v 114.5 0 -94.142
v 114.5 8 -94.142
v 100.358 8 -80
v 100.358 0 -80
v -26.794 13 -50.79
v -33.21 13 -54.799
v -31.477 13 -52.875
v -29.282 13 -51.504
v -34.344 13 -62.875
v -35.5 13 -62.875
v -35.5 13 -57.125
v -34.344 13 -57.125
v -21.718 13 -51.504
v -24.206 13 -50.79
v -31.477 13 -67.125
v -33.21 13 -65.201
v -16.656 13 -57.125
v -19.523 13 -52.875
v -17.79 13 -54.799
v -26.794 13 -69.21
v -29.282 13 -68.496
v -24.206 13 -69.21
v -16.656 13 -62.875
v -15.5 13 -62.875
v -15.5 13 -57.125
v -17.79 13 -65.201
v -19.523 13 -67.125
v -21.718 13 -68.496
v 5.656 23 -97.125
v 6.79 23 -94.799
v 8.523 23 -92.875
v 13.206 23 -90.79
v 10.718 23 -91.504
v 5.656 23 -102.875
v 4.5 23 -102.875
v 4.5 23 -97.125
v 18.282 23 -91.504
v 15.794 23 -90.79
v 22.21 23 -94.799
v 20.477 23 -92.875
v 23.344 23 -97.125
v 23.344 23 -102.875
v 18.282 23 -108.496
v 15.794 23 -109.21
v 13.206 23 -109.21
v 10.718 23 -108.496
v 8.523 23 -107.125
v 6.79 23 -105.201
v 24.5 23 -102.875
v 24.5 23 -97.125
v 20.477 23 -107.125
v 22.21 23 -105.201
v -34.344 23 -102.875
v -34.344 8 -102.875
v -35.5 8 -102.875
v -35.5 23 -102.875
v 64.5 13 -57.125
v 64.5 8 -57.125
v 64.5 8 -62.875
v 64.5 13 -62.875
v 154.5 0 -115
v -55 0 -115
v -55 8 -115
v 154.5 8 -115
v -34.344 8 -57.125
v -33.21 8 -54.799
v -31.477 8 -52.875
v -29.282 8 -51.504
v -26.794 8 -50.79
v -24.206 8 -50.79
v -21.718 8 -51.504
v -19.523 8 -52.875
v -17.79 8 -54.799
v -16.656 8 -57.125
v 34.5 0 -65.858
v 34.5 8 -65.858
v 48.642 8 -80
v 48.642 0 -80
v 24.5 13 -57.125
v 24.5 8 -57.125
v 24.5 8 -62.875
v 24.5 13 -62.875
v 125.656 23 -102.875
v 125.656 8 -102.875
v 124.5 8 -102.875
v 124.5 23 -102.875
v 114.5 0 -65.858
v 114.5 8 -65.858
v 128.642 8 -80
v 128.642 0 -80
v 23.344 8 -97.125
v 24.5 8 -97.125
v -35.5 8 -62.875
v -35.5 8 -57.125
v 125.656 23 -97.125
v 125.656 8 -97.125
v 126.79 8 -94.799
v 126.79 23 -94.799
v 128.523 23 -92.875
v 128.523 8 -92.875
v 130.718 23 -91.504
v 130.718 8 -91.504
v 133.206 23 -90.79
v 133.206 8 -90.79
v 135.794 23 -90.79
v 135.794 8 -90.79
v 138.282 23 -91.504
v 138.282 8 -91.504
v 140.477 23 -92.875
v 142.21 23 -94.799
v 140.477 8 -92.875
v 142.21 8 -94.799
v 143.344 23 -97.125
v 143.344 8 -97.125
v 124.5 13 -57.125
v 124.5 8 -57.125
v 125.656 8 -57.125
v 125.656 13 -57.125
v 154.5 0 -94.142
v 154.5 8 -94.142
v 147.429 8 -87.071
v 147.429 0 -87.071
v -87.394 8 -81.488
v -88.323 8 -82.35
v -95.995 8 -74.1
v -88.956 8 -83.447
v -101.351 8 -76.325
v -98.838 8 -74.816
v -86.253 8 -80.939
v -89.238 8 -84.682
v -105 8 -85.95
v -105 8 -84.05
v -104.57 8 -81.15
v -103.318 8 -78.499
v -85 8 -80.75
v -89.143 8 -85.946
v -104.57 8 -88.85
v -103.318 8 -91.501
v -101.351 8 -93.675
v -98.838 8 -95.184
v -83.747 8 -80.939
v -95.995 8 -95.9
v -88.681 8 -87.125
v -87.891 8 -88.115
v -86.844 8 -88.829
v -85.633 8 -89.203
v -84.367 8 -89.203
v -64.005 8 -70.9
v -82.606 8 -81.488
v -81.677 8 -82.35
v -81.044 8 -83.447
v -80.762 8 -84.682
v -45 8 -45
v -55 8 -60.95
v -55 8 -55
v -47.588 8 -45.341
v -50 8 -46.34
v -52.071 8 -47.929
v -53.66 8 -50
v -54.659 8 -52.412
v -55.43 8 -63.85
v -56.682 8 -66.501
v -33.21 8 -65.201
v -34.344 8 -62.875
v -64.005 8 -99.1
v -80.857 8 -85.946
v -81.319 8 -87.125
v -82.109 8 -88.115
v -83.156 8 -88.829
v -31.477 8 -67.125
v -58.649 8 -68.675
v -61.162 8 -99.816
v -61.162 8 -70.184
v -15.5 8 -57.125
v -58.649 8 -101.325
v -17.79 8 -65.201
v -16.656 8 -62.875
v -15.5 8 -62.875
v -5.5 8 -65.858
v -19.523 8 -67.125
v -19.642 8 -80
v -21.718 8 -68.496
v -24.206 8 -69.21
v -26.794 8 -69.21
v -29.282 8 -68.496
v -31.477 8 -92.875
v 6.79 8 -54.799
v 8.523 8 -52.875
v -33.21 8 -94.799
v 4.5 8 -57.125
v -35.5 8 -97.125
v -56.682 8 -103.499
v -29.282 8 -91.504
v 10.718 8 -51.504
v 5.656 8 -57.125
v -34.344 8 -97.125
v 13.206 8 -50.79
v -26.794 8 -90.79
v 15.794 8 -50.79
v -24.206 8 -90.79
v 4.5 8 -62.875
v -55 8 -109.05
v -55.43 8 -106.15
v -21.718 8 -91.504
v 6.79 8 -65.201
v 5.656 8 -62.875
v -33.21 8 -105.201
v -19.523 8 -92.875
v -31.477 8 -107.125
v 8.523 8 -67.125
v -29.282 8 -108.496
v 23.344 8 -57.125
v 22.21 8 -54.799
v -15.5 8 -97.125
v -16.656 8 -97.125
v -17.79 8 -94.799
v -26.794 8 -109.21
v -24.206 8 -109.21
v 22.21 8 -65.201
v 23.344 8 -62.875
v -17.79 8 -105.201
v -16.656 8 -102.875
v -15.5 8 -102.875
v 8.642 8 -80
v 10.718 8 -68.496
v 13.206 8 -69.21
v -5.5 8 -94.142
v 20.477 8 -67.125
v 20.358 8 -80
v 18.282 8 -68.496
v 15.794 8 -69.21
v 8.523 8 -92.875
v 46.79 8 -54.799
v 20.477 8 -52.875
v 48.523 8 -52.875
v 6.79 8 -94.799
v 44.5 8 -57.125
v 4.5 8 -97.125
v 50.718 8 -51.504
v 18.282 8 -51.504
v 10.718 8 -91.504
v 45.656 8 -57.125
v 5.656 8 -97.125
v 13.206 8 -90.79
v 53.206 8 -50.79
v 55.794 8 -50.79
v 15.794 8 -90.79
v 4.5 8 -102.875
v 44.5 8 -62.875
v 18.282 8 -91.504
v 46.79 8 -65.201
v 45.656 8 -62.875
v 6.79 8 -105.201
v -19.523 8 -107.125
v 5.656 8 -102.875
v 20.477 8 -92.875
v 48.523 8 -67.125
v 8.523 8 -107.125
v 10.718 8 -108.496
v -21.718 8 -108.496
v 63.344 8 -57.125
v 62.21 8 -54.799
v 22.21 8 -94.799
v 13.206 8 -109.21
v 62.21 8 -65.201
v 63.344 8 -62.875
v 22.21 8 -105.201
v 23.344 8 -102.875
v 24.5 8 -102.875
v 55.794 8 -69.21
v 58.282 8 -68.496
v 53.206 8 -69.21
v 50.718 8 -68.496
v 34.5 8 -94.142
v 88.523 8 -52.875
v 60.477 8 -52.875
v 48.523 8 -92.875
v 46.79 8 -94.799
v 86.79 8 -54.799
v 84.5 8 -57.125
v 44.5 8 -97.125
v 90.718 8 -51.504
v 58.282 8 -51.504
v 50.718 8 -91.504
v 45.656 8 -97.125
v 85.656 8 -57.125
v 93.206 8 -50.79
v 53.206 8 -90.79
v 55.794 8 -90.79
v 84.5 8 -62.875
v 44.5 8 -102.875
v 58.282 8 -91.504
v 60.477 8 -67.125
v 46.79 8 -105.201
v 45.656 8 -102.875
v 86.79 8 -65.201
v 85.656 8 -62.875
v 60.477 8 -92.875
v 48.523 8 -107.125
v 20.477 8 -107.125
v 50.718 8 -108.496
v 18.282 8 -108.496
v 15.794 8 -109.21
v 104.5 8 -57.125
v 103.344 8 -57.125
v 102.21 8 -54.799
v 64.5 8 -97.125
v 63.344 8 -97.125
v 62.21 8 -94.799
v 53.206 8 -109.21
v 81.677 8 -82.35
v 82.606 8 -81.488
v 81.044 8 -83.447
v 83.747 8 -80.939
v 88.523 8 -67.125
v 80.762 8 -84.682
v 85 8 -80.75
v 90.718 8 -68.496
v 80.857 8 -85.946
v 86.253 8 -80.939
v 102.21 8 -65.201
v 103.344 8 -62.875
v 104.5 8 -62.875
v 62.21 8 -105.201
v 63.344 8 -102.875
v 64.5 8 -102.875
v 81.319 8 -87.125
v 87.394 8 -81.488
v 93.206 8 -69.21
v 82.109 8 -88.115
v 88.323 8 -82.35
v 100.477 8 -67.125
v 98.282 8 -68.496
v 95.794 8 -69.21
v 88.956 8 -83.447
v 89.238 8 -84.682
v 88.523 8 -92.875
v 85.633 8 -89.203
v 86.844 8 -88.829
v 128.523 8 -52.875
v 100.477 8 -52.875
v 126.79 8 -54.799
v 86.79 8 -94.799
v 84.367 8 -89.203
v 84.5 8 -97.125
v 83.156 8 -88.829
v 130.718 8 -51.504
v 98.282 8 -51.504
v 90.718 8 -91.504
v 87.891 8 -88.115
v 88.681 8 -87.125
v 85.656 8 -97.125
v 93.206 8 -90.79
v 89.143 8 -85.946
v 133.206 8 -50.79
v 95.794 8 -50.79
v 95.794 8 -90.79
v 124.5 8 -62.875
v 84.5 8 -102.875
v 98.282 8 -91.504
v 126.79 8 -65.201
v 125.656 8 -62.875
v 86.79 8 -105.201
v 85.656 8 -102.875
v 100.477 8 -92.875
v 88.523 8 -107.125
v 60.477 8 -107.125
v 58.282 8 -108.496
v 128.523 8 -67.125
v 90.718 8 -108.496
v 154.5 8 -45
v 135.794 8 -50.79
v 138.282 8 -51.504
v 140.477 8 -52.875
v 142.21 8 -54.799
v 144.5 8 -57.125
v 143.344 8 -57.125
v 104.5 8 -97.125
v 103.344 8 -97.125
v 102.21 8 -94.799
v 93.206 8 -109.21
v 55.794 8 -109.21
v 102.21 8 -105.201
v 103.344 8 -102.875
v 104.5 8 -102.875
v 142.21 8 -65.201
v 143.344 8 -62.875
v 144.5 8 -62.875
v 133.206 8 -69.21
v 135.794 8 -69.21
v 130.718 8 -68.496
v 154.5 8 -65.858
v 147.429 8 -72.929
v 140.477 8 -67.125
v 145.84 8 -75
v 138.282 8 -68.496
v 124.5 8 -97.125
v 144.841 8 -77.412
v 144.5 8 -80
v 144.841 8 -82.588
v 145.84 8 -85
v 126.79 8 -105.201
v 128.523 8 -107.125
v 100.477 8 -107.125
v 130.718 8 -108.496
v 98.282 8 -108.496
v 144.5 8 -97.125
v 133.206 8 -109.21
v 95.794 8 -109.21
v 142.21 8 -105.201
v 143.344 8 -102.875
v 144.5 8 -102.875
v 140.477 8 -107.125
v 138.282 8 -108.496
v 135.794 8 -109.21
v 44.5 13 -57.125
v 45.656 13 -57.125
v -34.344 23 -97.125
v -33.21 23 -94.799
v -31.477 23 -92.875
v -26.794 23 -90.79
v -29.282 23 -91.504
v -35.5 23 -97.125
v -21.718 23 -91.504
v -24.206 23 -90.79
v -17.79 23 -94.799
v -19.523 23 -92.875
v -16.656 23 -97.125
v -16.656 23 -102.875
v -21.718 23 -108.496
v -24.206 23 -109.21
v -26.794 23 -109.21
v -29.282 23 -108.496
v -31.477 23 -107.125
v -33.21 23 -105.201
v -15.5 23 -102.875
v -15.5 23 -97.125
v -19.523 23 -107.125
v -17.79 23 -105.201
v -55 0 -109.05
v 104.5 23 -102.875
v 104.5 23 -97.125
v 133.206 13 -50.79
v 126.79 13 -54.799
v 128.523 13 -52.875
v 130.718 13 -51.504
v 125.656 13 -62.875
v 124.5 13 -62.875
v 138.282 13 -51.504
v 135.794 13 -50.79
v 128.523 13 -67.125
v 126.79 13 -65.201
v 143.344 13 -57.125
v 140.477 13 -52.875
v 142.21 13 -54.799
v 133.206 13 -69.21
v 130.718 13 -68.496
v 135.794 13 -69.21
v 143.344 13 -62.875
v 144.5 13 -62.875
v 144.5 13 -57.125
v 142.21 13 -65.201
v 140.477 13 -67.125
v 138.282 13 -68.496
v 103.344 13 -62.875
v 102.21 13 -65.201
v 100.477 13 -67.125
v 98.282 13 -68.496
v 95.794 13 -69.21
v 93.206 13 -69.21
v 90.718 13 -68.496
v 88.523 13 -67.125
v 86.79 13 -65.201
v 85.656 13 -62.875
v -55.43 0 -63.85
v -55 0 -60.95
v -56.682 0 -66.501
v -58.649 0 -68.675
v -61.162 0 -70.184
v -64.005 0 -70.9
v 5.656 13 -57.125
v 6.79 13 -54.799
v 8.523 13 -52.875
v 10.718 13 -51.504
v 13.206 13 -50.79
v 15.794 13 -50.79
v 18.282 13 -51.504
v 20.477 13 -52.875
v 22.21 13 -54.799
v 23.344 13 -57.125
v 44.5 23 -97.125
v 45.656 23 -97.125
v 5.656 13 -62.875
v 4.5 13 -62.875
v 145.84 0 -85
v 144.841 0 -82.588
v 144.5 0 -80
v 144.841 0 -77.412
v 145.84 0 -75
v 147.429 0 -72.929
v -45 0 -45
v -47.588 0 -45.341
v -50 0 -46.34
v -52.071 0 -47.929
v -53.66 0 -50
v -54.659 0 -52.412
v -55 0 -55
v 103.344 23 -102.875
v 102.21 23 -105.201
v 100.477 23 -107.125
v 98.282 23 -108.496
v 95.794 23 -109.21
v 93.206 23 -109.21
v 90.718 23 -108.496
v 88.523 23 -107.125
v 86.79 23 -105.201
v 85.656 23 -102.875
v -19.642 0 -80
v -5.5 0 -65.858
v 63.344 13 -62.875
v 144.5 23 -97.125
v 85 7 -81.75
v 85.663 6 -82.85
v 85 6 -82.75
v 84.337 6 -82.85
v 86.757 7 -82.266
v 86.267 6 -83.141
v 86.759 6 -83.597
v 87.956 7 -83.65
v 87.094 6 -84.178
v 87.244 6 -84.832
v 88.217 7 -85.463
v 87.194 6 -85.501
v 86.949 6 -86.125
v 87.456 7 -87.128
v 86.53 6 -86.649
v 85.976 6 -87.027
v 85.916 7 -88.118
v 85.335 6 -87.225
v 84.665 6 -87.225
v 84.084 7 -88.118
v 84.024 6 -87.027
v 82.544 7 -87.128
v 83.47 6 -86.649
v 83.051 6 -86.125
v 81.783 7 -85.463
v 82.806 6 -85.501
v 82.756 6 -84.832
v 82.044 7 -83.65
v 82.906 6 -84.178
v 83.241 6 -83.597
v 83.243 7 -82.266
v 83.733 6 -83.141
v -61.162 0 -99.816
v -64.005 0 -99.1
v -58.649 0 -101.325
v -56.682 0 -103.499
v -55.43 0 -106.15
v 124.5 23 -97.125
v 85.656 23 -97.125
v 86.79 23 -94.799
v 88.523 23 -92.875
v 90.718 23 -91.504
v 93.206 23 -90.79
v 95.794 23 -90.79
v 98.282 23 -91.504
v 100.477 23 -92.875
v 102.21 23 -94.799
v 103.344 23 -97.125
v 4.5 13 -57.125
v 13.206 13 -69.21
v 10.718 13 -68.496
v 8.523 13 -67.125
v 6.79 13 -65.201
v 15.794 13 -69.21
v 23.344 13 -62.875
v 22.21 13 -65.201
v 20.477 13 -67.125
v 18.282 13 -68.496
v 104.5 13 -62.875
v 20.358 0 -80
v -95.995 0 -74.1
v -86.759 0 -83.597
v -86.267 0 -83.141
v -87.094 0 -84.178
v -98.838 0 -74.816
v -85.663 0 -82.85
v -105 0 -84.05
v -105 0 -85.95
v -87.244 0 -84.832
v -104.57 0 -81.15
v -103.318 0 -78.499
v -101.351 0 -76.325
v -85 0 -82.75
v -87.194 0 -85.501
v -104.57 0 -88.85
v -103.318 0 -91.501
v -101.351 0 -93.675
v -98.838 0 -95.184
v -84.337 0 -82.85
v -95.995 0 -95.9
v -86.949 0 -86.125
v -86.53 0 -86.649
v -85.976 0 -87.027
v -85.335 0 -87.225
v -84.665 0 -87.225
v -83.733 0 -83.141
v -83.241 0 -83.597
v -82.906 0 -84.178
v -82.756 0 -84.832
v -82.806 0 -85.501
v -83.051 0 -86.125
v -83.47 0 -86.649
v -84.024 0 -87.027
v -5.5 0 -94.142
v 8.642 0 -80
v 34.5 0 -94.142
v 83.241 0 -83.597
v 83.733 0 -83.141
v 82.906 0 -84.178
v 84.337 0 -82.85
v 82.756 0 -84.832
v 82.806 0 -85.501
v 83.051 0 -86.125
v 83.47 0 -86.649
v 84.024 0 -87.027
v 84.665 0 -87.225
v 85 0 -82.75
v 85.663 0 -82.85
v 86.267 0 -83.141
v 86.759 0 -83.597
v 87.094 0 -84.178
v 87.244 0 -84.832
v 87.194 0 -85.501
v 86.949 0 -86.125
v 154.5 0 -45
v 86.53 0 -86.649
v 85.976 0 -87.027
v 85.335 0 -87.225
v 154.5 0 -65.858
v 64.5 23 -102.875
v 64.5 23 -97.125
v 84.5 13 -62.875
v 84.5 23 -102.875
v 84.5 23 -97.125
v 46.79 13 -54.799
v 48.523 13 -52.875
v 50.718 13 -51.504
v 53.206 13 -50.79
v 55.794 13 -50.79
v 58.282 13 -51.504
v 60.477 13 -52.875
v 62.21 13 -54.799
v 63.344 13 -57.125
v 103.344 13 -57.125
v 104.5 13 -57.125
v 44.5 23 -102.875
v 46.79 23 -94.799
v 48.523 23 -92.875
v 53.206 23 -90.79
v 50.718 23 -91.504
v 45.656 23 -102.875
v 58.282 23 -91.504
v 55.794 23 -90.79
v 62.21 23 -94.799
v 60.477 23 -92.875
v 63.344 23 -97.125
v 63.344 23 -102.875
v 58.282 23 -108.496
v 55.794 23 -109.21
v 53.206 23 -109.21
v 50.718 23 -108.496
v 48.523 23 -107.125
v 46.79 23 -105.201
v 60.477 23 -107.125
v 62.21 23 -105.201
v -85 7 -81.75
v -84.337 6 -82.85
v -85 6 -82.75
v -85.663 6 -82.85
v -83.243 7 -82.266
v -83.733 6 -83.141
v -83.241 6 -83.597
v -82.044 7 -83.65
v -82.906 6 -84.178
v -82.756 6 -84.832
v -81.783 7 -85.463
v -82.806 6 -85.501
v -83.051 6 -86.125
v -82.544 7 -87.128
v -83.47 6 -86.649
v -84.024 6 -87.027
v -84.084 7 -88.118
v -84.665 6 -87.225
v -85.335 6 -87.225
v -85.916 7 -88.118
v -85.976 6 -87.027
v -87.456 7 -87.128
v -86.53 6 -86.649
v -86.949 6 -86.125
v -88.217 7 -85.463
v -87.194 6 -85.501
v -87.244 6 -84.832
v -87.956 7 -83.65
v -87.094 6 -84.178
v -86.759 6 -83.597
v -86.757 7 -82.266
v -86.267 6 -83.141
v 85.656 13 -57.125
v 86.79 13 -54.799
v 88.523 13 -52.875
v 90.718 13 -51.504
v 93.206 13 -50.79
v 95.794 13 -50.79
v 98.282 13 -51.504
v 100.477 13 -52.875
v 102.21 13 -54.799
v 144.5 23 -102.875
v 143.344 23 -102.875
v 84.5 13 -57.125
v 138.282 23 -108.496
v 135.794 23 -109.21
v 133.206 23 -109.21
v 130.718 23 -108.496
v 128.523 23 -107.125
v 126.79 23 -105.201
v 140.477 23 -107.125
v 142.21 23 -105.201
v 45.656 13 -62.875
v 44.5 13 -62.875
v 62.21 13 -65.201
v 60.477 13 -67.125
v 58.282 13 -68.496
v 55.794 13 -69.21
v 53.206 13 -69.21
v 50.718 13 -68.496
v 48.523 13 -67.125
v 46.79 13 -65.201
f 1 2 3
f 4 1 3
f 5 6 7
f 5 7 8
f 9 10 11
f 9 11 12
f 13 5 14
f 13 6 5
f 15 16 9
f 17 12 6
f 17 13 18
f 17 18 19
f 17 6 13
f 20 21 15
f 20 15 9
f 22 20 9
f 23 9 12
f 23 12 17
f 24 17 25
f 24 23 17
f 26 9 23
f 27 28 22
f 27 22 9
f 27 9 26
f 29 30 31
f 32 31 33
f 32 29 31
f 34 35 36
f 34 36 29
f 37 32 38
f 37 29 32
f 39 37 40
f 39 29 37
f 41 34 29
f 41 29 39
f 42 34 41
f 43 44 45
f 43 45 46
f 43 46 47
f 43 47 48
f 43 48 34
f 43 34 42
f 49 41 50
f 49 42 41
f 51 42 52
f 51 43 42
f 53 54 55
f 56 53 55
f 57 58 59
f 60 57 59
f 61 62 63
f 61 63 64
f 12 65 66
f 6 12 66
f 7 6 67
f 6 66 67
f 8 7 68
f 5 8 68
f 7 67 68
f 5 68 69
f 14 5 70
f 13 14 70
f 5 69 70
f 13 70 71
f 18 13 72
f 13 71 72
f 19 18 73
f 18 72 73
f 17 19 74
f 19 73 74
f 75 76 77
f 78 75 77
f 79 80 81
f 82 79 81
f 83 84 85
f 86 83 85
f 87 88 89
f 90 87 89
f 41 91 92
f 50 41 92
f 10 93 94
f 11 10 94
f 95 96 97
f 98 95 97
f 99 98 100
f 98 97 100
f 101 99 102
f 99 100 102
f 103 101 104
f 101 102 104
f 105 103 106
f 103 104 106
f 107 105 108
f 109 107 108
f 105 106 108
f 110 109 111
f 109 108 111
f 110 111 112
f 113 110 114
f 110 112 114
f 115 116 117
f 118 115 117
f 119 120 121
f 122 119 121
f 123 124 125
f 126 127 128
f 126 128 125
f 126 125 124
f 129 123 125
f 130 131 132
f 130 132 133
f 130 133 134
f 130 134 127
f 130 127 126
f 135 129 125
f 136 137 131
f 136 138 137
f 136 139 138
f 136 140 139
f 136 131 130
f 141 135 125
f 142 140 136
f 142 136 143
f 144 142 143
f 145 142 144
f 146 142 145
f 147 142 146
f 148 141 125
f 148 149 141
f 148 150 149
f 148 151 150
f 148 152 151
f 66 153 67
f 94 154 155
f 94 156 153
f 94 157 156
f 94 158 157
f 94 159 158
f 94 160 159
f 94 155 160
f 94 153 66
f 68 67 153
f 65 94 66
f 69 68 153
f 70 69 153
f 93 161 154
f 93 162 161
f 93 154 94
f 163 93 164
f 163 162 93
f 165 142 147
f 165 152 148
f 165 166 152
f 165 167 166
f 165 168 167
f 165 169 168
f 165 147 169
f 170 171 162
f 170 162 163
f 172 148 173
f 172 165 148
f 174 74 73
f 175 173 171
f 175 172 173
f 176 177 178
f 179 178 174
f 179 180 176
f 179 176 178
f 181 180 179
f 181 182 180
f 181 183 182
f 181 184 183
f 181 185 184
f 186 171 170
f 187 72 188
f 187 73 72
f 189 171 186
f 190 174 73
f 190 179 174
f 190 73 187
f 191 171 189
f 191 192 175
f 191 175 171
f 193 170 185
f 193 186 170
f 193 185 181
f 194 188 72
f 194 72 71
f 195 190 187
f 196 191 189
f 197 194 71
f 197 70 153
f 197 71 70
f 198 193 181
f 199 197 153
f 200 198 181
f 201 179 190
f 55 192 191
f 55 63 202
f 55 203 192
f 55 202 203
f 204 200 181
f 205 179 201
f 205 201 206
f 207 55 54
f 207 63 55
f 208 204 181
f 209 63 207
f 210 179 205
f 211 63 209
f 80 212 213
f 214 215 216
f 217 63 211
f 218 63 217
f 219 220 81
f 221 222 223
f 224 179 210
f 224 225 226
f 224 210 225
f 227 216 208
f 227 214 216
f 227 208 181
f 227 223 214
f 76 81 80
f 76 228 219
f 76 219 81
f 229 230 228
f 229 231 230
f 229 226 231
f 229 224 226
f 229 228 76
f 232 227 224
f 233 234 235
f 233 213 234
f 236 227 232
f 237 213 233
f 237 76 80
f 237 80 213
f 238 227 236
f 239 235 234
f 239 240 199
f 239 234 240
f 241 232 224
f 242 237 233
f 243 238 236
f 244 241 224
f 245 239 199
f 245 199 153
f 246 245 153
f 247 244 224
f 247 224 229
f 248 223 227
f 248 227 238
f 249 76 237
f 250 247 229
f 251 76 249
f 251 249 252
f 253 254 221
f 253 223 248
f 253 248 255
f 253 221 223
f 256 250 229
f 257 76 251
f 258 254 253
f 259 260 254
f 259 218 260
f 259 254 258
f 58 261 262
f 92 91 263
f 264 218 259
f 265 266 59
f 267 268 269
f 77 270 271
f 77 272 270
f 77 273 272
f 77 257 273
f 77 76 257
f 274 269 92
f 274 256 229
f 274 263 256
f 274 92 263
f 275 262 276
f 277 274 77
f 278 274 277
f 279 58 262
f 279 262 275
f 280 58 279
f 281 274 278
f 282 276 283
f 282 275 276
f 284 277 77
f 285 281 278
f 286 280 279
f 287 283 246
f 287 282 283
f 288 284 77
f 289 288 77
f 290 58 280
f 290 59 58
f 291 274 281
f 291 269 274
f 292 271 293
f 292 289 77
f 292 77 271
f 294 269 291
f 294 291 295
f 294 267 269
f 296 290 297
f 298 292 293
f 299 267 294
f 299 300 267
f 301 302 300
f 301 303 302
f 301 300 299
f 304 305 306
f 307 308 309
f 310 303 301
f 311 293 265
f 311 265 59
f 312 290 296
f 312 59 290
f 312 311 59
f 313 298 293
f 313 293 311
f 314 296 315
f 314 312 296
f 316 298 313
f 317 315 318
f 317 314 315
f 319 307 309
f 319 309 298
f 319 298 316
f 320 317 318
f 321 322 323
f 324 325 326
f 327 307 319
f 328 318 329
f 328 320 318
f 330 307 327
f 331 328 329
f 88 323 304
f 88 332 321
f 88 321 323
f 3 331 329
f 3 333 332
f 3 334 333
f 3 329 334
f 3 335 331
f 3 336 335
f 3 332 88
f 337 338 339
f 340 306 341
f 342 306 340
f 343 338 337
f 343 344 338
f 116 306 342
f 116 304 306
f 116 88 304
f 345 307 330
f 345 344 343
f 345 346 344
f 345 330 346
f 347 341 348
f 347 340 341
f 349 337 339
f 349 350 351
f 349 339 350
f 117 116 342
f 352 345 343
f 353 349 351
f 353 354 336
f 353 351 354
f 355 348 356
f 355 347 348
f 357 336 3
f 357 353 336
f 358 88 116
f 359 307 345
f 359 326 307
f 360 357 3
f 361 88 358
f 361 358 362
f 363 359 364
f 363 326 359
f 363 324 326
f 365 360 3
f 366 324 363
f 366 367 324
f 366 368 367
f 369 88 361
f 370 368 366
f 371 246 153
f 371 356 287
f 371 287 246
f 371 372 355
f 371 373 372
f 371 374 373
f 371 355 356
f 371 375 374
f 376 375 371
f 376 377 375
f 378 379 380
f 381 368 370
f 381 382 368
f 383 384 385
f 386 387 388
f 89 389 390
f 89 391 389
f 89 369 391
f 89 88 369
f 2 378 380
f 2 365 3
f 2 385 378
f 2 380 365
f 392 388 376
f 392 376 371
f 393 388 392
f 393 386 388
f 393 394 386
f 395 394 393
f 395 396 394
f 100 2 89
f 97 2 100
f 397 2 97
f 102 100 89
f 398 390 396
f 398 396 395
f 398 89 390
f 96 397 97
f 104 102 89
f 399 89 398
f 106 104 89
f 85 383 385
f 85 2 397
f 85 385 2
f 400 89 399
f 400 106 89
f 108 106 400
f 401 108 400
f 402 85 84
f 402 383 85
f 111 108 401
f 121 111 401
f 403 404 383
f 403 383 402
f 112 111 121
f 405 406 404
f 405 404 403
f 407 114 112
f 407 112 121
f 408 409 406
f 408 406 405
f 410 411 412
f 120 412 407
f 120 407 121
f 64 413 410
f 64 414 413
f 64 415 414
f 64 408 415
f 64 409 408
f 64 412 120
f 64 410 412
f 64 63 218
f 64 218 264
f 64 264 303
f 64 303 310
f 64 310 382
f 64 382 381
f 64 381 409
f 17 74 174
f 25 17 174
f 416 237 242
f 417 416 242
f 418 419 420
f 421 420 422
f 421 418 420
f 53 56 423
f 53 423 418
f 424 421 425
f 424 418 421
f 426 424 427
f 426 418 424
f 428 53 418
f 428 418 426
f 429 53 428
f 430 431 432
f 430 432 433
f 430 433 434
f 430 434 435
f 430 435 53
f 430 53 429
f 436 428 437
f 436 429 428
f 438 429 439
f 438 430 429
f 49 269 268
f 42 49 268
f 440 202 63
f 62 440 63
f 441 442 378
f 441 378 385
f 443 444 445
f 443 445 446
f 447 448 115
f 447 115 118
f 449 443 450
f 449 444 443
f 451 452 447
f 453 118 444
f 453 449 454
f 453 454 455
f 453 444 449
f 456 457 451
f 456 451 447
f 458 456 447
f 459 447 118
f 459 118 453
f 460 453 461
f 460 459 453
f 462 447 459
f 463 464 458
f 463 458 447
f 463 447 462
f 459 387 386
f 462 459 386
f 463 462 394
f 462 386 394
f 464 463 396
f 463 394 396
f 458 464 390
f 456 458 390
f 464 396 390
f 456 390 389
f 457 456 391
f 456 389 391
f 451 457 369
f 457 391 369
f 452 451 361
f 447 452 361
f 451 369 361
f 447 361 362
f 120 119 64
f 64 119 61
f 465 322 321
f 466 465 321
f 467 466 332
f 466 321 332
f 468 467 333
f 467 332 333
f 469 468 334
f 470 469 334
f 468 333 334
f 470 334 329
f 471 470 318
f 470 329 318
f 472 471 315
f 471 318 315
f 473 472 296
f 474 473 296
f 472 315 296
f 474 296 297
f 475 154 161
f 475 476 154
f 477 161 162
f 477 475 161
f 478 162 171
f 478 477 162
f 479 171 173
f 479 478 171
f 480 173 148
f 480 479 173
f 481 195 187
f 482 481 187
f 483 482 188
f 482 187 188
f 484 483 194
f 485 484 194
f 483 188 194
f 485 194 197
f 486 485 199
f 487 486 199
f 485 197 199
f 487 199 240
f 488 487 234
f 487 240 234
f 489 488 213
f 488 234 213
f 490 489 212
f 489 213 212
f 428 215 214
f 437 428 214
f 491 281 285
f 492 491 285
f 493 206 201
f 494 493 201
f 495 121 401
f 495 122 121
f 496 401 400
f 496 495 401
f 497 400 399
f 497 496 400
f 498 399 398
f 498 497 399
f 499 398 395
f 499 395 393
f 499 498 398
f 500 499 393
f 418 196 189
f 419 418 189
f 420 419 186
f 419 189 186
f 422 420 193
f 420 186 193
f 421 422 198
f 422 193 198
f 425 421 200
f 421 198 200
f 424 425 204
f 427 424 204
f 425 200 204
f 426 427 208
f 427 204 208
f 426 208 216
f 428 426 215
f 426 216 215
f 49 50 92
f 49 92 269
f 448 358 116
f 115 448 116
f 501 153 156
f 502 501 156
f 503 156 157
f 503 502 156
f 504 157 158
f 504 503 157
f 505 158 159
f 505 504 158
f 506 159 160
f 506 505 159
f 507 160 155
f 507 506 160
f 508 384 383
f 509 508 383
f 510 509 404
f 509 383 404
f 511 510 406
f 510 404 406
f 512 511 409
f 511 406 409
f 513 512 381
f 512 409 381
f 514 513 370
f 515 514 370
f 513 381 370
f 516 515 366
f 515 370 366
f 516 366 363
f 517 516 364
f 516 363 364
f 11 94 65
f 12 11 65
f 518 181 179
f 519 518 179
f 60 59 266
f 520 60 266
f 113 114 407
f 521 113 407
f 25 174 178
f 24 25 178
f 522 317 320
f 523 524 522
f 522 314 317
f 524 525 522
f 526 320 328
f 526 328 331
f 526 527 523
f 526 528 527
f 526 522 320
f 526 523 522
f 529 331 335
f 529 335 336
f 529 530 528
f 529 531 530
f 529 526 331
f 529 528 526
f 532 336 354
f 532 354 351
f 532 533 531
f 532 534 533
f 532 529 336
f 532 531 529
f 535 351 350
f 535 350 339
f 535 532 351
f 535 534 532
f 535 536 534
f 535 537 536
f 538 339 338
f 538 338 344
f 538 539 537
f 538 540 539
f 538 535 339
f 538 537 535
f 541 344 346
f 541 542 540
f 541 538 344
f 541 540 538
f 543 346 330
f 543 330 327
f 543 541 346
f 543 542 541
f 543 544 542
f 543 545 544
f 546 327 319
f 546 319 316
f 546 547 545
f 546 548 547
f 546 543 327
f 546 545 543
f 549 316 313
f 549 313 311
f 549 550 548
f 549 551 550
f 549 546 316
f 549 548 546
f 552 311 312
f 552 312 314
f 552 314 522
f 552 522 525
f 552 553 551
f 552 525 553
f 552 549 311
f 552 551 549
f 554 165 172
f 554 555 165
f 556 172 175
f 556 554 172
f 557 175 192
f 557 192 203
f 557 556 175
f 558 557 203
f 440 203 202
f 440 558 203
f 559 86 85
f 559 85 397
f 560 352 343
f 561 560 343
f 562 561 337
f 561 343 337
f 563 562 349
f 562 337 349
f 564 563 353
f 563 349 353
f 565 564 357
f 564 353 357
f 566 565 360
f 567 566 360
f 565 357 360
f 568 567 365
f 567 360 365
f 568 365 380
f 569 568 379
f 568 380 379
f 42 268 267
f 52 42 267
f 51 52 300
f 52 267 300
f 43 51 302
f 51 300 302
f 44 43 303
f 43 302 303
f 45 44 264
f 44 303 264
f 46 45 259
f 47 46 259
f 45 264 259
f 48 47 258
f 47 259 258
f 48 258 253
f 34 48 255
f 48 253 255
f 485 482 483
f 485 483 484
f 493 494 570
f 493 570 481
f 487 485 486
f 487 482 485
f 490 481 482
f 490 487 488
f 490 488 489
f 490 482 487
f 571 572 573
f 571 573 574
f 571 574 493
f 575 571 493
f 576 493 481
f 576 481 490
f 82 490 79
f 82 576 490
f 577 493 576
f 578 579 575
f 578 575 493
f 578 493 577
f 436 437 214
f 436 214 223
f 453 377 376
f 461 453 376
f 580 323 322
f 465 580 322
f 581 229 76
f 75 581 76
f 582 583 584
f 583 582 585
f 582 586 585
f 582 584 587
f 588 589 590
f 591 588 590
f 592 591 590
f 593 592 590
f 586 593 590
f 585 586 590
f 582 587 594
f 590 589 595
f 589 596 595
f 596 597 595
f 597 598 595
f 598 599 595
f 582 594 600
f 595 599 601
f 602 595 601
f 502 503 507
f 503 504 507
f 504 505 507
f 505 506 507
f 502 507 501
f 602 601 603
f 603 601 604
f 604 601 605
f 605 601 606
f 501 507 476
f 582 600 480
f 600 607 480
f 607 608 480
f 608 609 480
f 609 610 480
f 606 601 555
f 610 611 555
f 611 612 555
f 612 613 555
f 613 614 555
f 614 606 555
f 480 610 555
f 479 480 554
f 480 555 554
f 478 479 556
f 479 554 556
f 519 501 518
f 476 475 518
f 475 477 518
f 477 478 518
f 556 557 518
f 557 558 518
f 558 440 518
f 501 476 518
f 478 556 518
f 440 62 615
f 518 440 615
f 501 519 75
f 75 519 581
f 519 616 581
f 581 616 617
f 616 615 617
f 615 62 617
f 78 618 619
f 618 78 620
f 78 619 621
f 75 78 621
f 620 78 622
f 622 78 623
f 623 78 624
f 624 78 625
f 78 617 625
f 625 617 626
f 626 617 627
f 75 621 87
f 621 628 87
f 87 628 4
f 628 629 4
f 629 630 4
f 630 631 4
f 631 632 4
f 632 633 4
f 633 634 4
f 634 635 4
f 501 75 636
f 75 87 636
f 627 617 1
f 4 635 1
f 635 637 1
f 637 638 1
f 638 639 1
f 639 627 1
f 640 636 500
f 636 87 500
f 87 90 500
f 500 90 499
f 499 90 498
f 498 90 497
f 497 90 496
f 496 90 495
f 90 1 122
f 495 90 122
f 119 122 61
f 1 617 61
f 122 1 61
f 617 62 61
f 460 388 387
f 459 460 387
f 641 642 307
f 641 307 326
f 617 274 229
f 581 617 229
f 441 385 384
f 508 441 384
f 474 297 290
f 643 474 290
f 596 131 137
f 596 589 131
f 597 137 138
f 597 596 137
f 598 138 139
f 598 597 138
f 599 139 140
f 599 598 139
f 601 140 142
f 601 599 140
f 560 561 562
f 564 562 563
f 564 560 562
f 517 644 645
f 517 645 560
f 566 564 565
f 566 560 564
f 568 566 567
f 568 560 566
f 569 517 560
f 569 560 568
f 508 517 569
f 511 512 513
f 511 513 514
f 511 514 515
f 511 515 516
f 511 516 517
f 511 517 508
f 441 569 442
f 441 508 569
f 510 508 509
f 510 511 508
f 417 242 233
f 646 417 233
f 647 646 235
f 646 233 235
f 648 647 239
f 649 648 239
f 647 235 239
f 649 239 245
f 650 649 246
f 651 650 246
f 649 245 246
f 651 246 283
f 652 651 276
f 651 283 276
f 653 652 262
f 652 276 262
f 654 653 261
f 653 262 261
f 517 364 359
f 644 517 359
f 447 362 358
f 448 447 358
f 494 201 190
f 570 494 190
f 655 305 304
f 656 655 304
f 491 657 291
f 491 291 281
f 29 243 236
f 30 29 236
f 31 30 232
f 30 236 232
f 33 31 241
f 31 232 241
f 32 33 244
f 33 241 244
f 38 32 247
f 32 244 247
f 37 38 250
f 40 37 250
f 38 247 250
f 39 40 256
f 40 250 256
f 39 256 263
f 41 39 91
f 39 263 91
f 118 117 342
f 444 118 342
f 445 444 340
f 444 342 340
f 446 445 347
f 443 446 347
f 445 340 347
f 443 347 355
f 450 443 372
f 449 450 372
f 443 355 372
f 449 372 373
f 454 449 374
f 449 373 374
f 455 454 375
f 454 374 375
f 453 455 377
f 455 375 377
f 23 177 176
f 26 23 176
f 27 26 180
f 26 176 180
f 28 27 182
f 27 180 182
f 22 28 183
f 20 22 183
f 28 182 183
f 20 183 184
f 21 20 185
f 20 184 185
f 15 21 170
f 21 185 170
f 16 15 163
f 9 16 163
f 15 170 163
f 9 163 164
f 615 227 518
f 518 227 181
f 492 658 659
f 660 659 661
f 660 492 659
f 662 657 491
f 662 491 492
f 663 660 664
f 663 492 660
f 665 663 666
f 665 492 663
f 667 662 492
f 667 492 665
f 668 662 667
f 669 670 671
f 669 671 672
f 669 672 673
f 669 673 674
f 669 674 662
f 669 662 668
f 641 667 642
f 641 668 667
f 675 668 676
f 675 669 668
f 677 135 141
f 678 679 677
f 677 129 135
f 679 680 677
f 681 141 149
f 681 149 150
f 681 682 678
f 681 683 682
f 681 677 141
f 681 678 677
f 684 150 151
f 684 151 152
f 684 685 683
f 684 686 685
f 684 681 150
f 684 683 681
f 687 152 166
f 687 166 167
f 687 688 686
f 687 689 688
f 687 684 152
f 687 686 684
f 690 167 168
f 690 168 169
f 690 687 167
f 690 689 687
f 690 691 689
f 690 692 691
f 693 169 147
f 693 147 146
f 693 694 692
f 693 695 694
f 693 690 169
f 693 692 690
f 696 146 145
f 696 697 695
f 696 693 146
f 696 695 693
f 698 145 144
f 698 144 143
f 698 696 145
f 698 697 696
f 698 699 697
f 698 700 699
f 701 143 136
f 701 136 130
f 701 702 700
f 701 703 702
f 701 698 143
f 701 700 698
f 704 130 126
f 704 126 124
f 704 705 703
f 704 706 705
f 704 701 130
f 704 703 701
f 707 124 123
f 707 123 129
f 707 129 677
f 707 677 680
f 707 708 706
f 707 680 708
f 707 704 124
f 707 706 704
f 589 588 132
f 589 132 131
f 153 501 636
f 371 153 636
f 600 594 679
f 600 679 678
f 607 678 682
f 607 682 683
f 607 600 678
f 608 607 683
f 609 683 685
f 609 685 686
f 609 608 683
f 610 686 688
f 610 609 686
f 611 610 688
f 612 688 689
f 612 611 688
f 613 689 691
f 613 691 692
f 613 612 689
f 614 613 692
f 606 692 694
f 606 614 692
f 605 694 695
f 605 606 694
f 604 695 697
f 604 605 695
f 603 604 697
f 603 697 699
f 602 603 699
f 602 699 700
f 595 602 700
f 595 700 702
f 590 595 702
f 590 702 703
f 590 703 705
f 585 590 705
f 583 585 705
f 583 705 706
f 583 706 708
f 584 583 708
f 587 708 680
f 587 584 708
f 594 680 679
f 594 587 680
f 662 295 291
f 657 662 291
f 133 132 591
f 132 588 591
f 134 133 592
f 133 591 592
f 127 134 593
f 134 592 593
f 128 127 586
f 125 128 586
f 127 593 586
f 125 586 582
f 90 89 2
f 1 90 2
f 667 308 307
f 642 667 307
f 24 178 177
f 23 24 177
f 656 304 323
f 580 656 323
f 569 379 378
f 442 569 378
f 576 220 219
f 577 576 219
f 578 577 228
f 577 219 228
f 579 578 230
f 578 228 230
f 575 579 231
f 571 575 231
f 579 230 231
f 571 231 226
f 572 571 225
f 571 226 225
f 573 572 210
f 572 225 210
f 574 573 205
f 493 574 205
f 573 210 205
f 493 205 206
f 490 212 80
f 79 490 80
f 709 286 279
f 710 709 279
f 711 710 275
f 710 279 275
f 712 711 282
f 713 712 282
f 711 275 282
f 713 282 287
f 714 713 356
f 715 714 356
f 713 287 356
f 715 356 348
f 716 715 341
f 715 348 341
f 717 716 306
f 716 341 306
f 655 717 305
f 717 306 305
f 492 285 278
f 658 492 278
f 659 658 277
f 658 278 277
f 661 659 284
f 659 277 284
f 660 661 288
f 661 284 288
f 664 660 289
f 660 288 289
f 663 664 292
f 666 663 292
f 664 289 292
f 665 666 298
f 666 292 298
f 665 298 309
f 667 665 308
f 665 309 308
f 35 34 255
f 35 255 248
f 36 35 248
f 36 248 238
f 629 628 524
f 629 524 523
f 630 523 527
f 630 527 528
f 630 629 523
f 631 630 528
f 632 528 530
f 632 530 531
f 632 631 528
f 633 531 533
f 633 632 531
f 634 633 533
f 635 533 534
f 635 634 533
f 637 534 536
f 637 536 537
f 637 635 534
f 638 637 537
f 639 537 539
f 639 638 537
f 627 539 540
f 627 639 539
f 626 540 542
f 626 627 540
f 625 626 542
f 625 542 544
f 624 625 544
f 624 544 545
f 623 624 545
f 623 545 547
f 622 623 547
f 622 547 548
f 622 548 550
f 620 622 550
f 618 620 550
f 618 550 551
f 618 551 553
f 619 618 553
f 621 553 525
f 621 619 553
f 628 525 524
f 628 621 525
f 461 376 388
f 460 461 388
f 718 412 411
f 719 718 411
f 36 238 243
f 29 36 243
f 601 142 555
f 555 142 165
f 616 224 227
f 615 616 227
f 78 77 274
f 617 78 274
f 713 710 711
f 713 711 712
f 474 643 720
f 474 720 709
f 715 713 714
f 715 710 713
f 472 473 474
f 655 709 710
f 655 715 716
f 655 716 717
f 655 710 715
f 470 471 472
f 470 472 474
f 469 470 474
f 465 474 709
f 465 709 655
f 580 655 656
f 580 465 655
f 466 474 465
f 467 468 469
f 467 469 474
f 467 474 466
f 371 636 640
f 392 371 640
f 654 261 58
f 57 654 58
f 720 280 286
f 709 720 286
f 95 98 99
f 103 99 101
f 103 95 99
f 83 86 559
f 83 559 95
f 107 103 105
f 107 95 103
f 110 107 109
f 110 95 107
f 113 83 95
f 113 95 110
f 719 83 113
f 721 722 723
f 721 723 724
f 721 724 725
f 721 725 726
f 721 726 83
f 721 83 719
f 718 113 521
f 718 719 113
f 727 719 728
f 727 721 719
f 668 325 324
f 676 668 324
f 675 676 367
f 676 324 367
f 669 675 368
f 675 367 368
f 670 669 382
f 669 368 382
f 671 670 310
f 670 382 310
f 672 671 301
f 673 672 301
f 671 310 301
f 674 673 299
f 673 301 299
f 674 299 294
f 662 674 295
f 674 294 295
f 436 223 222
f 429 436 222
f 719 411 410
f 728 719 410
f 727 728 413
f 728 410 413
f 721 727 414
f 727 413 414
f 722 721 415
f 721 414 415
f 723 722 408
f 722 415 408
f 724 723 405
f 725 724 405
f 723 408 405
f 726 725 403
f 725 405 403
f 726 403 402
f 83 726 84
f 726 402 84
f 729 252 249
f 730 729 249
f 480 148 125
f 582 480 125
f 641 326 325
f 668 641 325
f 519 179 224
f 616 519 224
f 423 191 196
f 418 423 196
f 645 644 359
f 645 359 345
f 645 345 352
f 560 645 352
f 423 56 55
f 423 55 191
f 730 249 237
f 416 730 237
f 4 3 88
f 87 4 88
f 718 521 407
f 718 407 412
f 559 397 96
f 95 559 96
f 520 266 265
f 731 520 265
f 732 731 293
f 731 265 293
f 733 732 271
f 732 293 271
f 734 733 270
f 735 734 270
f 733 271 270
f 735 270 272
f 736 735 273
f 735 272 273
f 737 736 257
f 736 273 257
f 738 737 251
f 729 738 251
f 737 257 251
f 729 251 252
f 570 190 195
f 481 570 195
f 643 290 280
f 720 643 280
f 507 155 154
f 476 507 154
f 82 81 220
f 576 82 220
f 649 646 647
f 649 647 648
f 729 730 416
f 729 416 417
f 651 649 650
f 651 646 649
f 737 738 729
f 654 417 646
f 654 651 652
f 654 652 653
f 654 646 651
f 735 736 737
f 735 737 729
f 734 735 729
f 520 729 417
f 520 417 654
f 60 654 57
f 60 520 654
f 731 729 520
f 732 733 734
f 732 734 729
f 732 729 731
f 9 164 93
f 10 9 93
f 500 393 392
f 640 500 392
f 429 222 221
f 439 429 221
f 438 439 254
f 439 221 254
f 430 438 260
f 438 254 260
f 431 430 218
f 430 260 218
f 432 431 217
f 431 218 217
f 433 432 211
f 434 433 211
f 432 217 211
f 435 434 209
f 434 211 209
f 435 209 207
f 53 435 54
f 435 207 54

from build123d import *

# Parameters (mm, degrees)
SKETCH1_W           = 259.5
SKETCH1_H           = 70
SKETCH1_R           = 2.25
BOSS_EXTRUDE1_DEPTH = 8
BOSS_EXTRUDE2_DEPTH = 5
BOSS_EXTRUDE3_DEPTH = 15
CHAMFER2_SIZE       = 2
CUT_EXTRUDE2_DEPTH  = 194.184497308
FILLET1_R           = 10


with BuildPart() as part:
    # Sketch1 → Boss-Extrude1 (new body)
    with BuildSketch(Plane(origin=(0, 0, 0), x_dir=(1, 0, 0), z_dir=(0, 1, 0))):
        with Locations((24.75, 80)):
            Rectangle(SKETCH1_W, SKETCH1_H)
        with Locations(Location((-85, 85, 0), (0, 0, 270))):
            Circle(SKETCH1_R, mode=Mode.SUBTRACT)
        with Locations(Location((85, 85, 0), (0, 0, 270))):
            Circle(SKETCH1_R, mode=Mode.SUBTRACT)
    extrude(amount=BOSS_EXTRUDE1_DEPTH)

    # Sketch3 → Boss-Extrude2 (add)
    with BuildSketch(Plane(origin=(0, 8, 0), x_dir=(1, 0, 0), z_dir=(0, 1, 0))):
        with BuildLine():
            Line((-15.5, 57.125), (-15.5, 62.875))
            Line((-15.5, 62.875), (-16.655545523, 62.875))
            ThreePointArc((-16.655545523, 62.875), (-25.5, 69.3), (-34.344454477, 62.875))
            Line((-34.344454477, 62.875), (-35.5, 62.875))
            Line((-35.5, 62.875), (-35.5, 57.125))
            Line((-35.5, 57.125), (-34.344454477, 57.125))
            ThreePointArc((-34.344454477, 57.125), (-25.5, 50.7), (-16.655545523, 57.125))
            Line((-16.655545523, 57.125), (-15.5, 57.125))
        make_face()
        with BuildLine():
            Line((24.5, 57.125), (24.5, 62.875))
            Line((24.5, 62.875), (23.344454477, 62.875))
            ThreePointArc((23.344454477, 62.875), (14.5, 69.3), (5.655545523, 62.875))
            Line((5.655545523, 62.875), (4.5, 62.875))
            Line((4.5, 62.875), (4.5, 57.125))
            Line((4.5, 57.125), (5.655545523, 57.125))
            ThreePointArc((5.655545523, 57.125), (14.5, 50.7), (23.344454477, 57.125))
            Line((23.344454477, 57.125), (24.5, 57.125))
        make_face()
        with BuildLine():
            Line((64.5, 57.125), (64.5, 62.875))
            Line((64.5, 62.875), (63.344454477, 62.875))
            ThreePointArc((63.344454477, 62.875), (54.5, 69.3), (45.655545523, 62.875))
            Line((45.655545523, 62.875), (44.5, 62.875))
            Line((44.5, 62.875), (44.5, 57.125))
            Line((44.5, 57.125), (45.655545523, 57.125))
            ThreePointArc((45.655545523, 57.125), (54.5, 50.7), (63.344454477, 57.125))
            Line((63.344454477, 57.125), (64.5, 57.125))
        make_face()
        with BuildLine():
            Line((104.5, 57.125), (104.5, 62.875))
            Line((104.5, 62.875), (103.344454477, 62.875))
            ThreePointArc((103.344454477, 62.875), (94.5, 69.3), (85.655545523, 62.875))
            Line((85.655545523, 62.875), (84.5, 62.875))
            Line((84.5, 62.875), (84.5, 57.125))
            Line((84.5, 57.125), (85.655545523, 57.125))
            ThreePointArc((85.655545523, 57.125), (94.5, 50.7), (103.344454477, 57.125))
            Line((103.344454477, 57.125), (104.5, 57.125))
        make_face()
        with BuildLine():
            Line((144.5, 57.125), (144.5, 62.875))
            Line((144.5, 62.875), (143.344454477, 62.875))
            ThreePointArc((143.344454477, 62.875), (134.5, 69.3), (125.655545523, 62.875))
            Line((125.655545523, 62.875), (124.5, 62.875))
            Line((124.5, 62.875), (124.5, 57.125))
            Line((124.5, 57.125), (125.655545523, 57.125))
            ThreePointArc((125.655545523, 57.125), (134.5, 50.7), (143.344454477, 57.125))
            Line((143.344454477, 57.125), (144.5, 57.125))
        make_face()
    extrude(amount=BOSS_EXTRUDE2_DEPTH)

    # Sketch3<3> → Boss-Extrude3 (add)
    with BuildSketch(Plane(origin=(0, 8, 0), x_dir=(1, 0, 0), z_dir=(0, 1, 0))):
        with BuildLine():
            Line((24.5, 97.125), (24.5, 102.875))
            Line((24.5, 102.875), (23.344454477, 102.875))
            ThreePointArc((23.344454477, 102.875), (14.5, 109.3), (5.655545523, 102.875))
            Line((5.655545523, 102.875), (4.5, 102.875))
            Line((4.5, 102.875), (4.5, 97.125))
            Line((4.5, 97.125), (5.655545523, 97.125))
            ThreePointArc((5.655545523, 97.125), (14.5, 90.7), (23.344454477, 97.125))
            Line((23.344454477, 97.125), (24.5, 97.125))
        make_face()
        with BuildLine():
            Line((64.5, 97.125), (64.5, 102.875))
            Line((64.5, 102.875), (63.344454477, 102.875))
            ThreePointArc((63.344454477, 102.875), (54.5, 109.3), (45.655545523, 102.875))
            Line((45.655545523, 102.875), (44.5, 102.875))
            Line((44.5, 102.875), (44.5, 97.125))
            Line((44.5, 97.125), (45.655545523, 97.125))
            ThreePointArc((45.655545523, 97.125), (54.5, 90.7), (63.344454477, 97.125))
            Line((63.344454477, 97.125), (64.5, 97.125))
        make_face()
        with BuildLine():
            Line((104.5, 97.125), (104.5, 102.875))
            Line((104.5, 102.875), (103.344454477, 102.875))
            ThreePointArc((103.344454477, 102.875), (94.5, 109.3), (85.655545523, 102.875))
            Line((85.655545523, 102.875), (84.5, 102.875))
            Line((84.5, 102.875), (84.5, 97.125))
            Line((84.5, 97.125), (85.655545523, 97.125))
            ThreePointArc((85.655545523, 97.125), (94.5, 90.7), (103.344454477, 97.125))
            Line((103.344454477, 97.125), (104.5, 97.125))
        make_face()
        with BuildLine():
            Line((144.5, 97.125), (144.5, 102.875))
            Line((144.5, 102.875), (143.344454477, 102.875))
            ThreePointArc((143.344454477, 102.875), (134.5, 109.3), (125.655545523, 102.875))
            Line((125.655545523, 102.875), (124.5, 102.875))
            Line((124.5, 102.875), (124.5, 97.125))
            Line((124.5, 97.125), (125.655545523, 97.125))
            ThreePointArc((125.655545523, 97.125), (134.5, 90.7), (143.344454477, 97.125))
            Line((143.344454477, 97.125), (144.5, 97.125))
        make_face()
        with BuildLine():
            Line((-15.5, 97.125), (-15.5, 102.875))
            Line((-15.5, 102.875), (-16.655545523, 102.875))
            ThreePointArc((-16.655545523, 102.875), (-25.5, 109.3), (-34.344454477, 102.875))
            Line((-34.344454477, 102.875), (-35.5, 102.875))
            Line((-35.5, 102.875), (-35.5, 97.125))
            Line((-35.5, 97.125), (-34.344454477, 97.125))
            ThreePointArc((-34.344454477, 97.125), (-25.5, 90.7), (-16.655545523, 97.125))
            Line((-16.655545523, 97.125), (-15.5, 97.125))
        make_face()
    extrude(amount=BOSS_EXTRUDE3_DEPTH)

    # Chamfer2
    chamfer2_edges = [part.edges().sort_by_distance(p)[0] for p in [
        (-85, 8, -87.25),
        (85, 8, -87.25),
    ]]
    chamfer(chamfer2_edges, length=CHAMFER2_SIZE)

    # Sketch5 → Cut-Extrude2 (cut, through all)
    with BuildSketch(Plane(origin=(0, 8, 0), x_dir=(1, 0, 0), z_dir=(0, 1, 0))):
        Polygon((-55, 70), (-105, 75), (-105, 45), (-55, 45), align=None)
        Polygon((34.5, 65.857864376), (48.642135624, 80), (34.5, 94.142135624), (20.357864376, 80), align=None)
        Polygon((-105, 115), (-105, 95), (-55, 100), (-55, 115), align=None)
        Polygon((114.5, 65.857864376), (128.642135624, 80), (114.5, 94.142135624), (100.357864376, 80), align=None)
        Polygon((154.5, 65.857864376), (168.642135624, 80), (154.5, 94.142135624), (140.357864376, 80), align=None)
        Polygon((-5.5, 65.857864376), (8.642135624, 80), (-5.5, 94.142135624), (-19.642135624, 80), align=None)
    extrude(amount=-CUT_EXTRUDE2_DEPTH, mode=Mode.SUBTRACT)

    # Fillet1
    fillet1_edges = [part.edges().sort_by_distance(p)[0] for p in [
        (140.357864376, 4, -80),
        (-55, 4, -100),
        (-105, 4, -95),
        (-105, 4, -75),
        (-55, 4, -70),
        (-55, 4, -45),
    ]]
    fillet(fillet1_edges, radius=FILLET1_R)


solid = part.part
